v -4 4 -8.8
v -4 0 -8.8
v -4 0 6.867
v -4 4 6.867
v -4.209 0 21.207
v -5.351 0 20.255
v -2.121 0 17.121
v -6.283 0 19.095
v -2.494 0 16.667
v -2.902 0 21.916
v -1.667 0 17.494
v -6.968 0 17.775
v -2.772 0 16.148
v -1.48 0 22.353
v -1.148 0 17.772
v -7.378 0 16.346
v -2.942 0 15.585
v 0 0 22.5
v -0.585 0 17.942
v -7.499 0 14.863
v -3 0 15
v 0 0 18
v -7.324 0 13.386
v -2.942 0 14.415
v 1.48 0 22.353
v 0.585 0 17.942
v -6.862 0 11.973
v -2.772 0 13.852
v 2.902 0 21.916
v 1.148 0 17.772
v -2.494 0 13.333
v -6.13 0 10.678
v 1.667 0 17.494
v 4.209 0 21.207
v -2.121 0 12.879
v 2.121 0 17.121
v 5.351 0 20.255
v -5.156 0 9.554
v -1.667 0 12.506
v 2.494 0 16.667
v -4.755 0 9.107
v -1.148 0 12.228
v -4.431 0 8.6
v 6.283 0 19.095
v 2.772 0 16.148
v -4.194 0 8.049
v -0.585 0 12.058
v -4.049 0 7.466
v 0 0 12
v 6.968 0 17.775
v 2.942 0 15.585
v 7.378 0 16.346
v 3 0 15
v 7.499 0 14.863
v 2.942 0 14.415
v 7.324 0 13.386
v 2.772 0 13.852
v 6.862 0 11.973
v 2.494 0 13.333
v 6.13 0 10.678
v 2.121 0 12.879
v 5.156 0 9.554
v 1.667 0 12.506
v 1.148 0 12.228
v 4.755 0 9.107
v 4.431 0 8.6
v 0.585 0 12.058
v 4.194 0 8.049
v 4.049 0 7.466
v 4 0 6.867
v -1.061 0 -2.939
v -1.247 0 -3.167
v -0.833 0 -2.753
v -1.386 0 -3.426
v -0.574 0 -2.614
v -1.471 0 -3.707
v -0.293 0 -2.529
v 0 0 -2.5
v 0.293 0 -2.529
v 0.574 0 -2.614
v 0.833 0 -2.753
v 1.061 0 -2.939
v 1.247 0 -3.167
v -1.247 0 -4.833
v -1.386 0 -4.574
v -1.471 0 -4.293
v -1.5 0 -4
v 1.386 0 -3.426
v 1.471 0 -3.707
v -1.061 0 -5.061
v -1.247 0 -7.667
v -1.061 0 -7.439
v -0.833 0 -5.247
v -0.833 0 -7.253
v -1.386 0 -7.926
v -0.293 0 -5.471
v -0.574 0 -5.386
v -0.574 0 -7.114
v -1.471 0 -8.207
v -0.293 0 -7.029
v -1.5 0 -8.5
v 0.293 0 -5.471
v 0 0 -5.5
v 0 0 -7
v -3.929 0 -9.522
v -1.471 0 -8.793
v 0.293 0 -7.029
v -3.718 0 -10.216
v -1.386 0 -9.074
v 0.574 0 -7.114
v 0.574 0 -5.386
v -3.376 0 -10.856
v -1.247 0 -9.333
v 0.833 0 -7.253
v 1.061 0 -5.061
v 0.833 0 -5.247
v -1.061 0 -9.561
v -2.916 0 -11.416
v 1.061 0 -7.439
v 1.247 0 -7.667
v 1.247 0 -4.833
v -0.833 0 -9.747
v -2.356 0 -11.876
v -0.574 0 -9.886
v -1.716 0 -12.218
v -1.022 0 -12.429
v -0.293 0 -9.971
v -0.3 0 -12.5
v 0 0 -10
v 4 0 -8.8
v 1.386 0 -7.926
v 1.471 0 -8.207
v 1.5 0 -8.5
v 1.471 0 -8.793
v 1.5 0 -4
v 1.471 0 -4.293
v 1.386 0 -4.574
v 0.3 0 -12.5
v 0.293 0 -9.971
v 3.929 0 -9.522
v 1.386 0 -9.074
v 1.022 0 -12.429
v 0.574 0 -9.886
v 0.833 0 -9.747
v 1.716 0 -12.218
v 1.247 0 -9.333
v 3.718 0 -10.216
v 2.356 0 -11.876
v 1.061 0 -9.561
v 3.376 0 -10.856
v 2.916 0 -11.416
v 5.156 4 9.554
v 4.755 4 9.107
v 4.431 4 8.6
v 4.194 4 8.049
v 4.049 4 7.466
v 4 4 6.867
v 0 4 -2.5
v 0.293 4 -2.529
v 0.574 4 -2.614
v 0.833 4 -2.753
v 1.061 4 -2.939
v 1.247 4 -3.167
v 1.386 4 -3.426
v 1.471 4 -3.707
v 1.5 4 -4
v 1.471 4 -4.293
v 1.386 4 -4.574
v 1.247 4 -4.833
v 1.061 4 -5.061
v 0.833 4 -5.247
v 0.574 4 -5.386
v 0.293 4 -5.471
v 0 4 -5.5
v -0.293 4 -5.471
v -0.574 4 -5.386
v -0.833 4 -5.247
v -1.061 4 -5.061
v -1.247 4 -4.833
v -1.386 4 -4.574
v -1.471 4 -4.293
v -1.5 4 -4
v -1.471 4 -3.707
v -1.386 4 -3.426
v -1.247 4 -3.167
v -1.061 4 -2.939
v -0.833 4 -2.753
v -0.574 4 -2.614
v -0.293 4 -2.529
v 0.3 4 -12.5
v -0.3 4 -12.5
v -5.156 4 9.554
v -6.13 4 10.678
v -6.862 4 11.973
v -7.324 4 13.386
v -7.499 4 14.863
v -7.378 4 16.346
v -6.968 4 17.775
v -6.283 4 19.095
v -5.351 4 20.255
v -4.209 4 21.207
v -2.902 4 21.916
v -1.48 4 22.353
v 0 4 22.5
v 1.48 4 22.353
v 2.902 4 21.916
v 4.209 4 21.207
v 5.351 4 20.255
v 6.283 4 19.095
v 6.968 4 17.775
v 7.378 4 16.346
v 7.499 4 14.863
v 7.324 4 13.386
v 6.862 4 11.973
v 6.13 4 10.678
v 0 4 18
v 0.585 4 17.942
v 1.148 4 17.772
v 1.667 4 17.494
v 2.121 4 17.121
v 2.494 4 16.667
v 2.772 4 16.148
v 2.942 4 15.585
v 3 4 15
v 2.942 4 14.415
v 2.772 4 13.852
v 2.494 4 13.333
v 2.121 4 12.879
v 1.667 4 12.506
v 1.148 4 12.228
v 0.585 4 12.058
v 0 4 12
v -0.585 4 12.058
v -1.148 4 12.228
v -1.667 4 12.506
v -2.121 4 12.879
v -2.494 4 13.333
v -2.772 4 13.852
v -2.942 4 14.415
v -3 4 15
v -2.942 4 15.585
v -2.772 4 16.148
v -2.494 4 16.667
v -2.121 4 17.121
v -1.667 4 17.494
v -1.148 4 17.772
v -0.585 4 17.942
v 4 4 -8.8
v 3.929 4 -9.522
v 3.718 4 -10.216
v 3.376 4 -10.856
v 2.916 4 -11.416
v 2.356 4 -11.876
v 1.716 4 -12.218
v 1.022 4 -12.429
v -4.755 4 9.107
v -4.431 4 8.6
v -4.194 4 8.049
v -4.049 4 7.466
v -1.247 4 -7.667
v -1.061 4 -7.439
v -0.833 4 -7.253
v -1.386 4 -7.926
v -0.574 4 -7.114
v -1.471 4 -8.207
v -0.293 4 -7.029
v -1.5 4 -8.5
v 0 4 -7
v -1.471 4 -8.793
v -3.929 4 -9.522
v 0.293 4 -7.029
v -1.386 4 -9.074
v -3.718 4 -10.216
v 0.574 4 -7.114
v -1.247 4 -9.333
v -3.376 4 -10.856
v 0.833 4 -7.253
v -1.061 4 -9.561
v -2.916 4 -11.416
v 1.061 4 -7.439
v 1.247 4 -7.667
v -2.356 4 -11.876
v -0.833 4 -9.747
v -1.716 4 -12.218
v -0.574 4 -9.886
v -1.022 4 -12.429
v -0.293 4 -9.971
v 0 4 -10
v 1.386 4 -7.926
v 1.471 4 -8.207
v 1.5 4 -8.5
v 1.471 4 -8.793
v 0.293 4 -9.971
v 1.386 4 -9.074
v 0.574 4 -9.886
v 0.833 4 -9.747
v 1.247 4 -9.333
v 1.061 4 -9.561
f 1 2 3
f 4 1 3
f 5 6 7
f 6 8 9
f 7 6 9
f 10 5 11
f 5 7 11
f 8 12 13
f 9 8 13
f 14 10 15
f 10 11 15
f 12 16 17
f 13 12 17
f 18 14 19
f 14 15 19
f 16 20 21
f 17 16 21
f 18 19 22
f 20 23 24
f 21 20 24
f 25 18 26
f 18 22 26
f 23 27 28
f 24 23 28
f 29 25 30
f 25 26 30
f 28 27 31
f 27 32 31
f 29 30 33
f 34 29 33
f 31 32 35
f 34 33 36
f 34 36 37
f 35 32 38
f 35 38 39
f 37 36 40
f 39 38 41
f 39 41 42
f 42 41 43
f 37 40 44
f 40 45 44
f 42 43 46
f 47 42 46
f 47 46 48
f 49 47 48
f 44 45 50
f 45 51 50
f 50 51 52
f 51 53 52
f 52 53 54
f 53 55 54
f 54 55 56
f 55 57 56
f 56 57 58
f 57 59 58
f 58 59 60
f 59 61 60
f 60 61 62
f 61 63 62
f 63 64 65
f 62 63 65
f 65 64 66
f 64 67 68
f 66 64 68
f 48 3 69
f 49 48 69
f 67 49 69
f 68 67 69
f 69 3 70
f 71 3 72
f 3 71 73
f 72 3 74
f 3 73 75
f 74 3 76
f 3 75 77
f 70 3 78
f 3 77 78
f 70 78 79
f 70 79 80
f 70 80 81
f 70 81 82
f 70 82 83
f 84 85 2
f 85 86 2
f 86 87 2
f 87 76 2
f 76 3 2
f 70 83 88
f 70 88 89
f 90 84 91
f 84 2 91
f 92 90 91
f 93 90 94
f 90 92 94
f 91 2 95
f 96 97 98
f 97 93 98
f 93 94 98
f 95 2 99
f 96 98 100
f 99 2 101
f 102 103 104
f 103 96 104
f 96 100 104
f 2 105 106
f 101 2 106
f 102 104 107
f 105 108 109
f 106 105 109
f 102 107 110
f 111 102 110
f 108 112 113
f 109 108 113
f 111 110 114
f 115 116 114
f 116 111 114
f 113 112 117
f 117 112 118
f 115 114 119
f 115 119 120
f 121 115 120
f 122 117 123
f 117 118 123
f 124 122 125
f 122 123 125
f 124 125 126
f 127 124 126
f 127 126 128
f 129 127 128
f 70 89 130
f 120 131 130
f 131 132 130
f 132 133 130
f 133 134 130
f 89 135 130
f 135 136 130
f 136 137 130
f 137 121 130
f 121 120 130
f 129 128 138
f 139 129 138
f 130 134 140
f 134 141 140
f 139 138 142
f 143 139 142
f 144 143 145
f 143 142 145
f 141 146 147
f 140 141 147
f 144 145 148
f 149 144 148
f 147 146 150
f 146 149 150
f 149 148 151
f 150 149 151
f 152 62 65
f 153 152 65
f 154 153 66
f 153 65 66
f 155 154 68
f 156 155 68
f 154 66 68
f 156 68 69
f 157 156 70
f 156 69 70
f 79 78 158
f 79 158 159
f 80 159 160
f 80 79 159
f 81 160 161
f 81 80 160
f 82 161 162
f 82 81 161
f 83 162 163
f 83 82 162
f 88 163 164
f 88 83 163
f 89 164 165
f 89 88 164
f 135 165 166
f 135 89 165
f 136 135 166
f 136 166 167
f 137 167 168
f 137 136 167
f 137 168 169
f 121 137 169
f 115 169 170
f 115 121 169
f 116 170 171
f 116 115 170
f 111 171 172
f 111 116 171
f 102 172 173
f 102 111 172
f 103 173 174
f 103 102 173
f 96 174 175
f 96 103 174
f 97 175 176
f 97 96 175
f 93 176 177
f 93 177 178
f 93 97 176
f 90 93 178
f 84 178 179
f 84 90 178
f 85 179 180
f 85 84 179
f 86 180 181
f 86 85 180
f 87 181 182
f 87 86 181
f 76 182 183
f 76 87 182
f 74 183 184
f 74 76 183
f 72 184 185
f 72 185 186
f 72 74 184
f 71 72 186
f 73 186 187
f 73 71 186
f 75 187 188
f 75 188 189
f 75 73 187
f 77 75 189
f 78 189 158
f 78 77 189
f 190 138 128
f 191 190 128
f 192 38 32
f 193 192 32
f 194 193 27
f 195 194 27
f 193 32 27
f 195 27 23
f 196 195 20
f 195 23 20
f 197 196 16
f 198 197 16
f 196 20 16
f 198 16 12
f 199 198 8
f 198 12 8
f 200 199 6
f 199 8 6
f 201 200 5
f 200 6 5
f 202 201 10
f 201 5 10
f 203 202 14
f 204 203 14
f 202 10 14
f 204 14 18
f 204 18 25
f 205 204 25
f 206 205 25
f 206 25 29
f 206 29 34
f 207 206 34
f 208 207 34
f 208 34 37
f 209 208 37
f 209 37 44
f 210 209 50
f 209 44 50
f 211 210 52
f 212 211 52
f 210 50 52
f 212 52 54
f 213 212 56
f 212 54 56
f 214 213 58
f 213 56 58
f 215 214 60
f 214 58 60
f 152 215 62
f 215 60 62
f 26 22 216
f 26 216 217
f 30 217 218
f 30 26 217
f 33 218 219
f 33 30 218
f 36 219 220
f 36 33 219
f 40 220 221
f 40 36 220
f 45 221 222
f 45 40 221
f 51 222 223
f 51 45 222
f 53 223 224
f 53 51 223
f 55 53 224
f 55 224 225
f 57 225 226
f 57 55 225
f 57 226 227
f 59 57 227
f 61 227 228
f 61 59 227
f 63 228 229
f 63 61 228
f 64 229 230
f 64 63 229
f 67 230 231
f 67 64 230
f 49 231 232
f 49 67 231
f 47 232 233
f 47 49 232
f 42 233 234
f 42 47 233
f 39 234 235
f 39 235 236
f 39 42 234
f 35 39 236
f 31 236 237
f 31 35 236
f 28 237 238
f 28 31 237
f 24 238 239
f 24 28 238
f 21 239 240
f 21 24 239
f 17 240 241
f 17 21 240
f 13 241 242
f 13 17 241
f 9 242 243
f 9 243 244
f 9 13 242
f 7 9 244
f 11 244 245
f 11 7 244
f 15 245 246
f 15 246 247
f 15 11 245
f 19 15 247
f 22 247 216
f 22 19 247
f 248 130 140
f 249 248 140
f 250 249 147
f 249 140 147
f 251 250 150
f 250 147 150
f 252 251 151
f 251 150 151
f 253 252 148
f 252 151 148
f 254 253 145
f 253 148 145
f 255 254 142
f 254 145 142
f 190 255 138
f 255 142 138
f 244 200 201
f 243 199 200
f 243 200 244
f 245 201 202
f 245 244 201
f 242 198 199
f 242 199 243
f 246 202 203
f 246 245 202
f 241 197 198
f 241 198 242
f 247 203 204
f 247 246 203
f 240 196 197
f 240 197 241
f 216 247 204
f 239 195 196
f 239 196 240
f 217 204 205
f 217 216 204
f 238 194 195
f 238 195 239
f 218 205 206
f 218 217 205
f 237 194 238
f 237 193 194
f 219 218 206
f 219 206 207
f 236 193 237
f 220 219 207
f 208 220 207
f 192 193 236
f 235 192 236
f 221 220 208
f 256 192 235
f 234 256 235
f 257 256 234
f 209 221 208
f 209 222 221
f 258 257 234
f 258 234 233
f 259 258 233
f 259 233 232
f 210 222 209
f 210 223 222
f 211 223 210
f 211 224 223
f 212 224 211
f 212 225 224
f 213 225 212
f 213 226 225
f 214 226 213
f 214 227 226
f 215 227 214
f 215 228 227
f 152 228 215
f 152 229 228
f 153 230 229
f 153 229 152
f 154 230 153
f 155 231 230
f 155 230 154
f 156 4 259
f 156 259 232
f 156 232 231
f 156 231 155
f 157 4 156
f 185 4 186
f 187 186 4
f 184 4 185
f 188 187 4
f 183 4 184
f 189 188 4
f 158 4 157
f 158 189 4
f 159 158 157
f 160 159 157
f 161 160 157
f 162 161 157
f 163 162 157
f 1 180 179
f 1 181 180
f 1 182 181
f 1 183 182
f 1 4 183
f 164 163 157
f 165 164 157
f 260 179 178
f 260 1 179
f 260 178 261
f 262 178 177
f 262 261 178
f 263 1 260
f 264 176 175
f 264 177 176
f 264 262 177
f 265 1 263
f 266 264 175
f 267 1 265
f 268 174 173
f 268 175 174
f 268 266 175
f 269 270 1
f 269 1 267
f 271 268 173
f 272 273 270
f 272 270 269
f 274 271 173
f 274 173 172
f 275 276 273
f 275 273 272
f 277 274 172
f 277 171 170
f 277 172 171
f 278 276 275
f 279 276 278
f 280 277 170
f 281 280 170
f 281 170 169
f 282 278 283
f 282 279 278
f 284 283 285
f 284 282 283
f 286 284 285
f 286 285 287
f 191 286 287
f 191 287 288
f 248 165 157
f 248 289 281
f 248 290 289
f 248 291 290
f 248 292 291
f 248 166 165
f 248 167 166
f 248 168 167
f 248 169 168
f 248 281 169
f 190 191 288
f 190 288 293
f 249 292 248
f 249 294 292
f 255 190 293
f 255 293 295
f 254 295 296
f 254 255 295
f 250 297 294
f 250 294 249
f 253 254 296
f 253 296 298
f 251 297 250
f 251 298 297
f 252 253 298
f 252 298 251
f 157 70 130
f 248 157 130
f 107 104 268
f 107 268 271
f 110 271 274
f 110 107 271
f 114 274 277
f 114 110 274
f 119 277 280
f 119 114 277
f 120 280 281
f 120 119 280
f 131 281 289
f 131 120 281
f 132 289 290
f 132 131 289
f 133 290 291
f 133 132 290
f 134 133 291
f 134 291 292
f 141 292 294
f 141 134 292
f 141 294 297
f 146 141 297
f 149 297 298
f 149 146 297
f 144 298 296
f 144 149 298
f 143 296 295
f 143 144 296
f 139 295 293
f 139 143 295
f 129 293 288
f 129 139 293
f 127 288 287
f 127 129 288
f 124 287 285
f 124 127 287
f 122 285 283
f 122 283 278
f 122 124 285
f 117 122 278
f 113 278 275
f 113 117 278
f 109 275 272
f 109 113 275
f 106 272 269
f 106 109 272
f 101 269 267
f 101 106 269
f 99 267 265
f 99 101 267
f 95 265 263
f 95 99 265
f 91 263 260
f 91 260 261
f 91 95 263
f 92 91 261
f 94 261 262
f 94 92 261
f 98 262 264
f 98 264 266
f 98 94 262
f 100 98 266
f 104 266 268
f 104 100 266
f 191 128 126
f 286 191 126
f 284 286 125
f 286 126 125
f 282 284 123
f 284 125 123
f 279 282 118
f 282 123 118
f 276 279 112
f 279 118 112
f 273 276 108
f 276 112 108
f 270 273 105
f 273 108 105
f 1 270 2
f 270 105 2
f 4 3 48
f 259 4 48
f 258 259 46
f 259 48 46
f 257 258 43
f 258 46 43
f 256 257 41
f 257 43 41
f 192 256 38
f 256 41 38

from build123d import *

# Parameters (mm, degrees)
SKETCH1_R           = 3
SKETCH1_R_2         = 1.5
BOSS_EXTRUDE1_DEPTH = 4


with BuildPart() as part:
    # Sketch1 → Boss-Extrude1 (new body)
    with BuildSketch(Plane(origin=(0, 0, 0), x_dir=(1, 0, 0), z_dir=(0, 1, 0))):
        with BuildLine():
            Line((-4, 8.8), (-4, -6.866734973))
            ThreePointArc((-4, -6.866734973), (-4.301332982, -8.329288391), (-5.15625, -9.553617169))
            ThreePointArc((-5.15625, -9.553617169), (0, -22.5), (5.15625, -9.553617169))
            ThreePointArc((5.15625, -9.553617169), (4.301332982, -8.329288391), (4, -6.866734973))
            Line((4, -6.866734973), (4, 8.8))
            ThreePointArc((4, 8.8), (2.91629509, 11.41629509), (0.3, 12.5))
            Line((0.3, 12.5), (-0.3, 12.5))
            ThreePointArc((-0.3, 12.5), (-2.91629509, 11.41629509), (-4, 8.8))
        make_face()
        with Locations(Location((0, -15, 0), (0, 0, 270))):
            Circle(SKETCH1_R, mode=Mode.SUBTRACT)
        with Locations(Location((0, 8.5, 0), (0, 0, 270))):
            Circle(SKETCH1_R_2, mode=Mode.SUBTRACT)
        with Locations(Location((0, 4, 0), (0, 0, 270))):
            Circle(SKETCH1_R_2, mode=Mode.SUBTRACT)
    extrude(amount=BOSS_EXTRUDE1_DEPTH)


solid = part.part
